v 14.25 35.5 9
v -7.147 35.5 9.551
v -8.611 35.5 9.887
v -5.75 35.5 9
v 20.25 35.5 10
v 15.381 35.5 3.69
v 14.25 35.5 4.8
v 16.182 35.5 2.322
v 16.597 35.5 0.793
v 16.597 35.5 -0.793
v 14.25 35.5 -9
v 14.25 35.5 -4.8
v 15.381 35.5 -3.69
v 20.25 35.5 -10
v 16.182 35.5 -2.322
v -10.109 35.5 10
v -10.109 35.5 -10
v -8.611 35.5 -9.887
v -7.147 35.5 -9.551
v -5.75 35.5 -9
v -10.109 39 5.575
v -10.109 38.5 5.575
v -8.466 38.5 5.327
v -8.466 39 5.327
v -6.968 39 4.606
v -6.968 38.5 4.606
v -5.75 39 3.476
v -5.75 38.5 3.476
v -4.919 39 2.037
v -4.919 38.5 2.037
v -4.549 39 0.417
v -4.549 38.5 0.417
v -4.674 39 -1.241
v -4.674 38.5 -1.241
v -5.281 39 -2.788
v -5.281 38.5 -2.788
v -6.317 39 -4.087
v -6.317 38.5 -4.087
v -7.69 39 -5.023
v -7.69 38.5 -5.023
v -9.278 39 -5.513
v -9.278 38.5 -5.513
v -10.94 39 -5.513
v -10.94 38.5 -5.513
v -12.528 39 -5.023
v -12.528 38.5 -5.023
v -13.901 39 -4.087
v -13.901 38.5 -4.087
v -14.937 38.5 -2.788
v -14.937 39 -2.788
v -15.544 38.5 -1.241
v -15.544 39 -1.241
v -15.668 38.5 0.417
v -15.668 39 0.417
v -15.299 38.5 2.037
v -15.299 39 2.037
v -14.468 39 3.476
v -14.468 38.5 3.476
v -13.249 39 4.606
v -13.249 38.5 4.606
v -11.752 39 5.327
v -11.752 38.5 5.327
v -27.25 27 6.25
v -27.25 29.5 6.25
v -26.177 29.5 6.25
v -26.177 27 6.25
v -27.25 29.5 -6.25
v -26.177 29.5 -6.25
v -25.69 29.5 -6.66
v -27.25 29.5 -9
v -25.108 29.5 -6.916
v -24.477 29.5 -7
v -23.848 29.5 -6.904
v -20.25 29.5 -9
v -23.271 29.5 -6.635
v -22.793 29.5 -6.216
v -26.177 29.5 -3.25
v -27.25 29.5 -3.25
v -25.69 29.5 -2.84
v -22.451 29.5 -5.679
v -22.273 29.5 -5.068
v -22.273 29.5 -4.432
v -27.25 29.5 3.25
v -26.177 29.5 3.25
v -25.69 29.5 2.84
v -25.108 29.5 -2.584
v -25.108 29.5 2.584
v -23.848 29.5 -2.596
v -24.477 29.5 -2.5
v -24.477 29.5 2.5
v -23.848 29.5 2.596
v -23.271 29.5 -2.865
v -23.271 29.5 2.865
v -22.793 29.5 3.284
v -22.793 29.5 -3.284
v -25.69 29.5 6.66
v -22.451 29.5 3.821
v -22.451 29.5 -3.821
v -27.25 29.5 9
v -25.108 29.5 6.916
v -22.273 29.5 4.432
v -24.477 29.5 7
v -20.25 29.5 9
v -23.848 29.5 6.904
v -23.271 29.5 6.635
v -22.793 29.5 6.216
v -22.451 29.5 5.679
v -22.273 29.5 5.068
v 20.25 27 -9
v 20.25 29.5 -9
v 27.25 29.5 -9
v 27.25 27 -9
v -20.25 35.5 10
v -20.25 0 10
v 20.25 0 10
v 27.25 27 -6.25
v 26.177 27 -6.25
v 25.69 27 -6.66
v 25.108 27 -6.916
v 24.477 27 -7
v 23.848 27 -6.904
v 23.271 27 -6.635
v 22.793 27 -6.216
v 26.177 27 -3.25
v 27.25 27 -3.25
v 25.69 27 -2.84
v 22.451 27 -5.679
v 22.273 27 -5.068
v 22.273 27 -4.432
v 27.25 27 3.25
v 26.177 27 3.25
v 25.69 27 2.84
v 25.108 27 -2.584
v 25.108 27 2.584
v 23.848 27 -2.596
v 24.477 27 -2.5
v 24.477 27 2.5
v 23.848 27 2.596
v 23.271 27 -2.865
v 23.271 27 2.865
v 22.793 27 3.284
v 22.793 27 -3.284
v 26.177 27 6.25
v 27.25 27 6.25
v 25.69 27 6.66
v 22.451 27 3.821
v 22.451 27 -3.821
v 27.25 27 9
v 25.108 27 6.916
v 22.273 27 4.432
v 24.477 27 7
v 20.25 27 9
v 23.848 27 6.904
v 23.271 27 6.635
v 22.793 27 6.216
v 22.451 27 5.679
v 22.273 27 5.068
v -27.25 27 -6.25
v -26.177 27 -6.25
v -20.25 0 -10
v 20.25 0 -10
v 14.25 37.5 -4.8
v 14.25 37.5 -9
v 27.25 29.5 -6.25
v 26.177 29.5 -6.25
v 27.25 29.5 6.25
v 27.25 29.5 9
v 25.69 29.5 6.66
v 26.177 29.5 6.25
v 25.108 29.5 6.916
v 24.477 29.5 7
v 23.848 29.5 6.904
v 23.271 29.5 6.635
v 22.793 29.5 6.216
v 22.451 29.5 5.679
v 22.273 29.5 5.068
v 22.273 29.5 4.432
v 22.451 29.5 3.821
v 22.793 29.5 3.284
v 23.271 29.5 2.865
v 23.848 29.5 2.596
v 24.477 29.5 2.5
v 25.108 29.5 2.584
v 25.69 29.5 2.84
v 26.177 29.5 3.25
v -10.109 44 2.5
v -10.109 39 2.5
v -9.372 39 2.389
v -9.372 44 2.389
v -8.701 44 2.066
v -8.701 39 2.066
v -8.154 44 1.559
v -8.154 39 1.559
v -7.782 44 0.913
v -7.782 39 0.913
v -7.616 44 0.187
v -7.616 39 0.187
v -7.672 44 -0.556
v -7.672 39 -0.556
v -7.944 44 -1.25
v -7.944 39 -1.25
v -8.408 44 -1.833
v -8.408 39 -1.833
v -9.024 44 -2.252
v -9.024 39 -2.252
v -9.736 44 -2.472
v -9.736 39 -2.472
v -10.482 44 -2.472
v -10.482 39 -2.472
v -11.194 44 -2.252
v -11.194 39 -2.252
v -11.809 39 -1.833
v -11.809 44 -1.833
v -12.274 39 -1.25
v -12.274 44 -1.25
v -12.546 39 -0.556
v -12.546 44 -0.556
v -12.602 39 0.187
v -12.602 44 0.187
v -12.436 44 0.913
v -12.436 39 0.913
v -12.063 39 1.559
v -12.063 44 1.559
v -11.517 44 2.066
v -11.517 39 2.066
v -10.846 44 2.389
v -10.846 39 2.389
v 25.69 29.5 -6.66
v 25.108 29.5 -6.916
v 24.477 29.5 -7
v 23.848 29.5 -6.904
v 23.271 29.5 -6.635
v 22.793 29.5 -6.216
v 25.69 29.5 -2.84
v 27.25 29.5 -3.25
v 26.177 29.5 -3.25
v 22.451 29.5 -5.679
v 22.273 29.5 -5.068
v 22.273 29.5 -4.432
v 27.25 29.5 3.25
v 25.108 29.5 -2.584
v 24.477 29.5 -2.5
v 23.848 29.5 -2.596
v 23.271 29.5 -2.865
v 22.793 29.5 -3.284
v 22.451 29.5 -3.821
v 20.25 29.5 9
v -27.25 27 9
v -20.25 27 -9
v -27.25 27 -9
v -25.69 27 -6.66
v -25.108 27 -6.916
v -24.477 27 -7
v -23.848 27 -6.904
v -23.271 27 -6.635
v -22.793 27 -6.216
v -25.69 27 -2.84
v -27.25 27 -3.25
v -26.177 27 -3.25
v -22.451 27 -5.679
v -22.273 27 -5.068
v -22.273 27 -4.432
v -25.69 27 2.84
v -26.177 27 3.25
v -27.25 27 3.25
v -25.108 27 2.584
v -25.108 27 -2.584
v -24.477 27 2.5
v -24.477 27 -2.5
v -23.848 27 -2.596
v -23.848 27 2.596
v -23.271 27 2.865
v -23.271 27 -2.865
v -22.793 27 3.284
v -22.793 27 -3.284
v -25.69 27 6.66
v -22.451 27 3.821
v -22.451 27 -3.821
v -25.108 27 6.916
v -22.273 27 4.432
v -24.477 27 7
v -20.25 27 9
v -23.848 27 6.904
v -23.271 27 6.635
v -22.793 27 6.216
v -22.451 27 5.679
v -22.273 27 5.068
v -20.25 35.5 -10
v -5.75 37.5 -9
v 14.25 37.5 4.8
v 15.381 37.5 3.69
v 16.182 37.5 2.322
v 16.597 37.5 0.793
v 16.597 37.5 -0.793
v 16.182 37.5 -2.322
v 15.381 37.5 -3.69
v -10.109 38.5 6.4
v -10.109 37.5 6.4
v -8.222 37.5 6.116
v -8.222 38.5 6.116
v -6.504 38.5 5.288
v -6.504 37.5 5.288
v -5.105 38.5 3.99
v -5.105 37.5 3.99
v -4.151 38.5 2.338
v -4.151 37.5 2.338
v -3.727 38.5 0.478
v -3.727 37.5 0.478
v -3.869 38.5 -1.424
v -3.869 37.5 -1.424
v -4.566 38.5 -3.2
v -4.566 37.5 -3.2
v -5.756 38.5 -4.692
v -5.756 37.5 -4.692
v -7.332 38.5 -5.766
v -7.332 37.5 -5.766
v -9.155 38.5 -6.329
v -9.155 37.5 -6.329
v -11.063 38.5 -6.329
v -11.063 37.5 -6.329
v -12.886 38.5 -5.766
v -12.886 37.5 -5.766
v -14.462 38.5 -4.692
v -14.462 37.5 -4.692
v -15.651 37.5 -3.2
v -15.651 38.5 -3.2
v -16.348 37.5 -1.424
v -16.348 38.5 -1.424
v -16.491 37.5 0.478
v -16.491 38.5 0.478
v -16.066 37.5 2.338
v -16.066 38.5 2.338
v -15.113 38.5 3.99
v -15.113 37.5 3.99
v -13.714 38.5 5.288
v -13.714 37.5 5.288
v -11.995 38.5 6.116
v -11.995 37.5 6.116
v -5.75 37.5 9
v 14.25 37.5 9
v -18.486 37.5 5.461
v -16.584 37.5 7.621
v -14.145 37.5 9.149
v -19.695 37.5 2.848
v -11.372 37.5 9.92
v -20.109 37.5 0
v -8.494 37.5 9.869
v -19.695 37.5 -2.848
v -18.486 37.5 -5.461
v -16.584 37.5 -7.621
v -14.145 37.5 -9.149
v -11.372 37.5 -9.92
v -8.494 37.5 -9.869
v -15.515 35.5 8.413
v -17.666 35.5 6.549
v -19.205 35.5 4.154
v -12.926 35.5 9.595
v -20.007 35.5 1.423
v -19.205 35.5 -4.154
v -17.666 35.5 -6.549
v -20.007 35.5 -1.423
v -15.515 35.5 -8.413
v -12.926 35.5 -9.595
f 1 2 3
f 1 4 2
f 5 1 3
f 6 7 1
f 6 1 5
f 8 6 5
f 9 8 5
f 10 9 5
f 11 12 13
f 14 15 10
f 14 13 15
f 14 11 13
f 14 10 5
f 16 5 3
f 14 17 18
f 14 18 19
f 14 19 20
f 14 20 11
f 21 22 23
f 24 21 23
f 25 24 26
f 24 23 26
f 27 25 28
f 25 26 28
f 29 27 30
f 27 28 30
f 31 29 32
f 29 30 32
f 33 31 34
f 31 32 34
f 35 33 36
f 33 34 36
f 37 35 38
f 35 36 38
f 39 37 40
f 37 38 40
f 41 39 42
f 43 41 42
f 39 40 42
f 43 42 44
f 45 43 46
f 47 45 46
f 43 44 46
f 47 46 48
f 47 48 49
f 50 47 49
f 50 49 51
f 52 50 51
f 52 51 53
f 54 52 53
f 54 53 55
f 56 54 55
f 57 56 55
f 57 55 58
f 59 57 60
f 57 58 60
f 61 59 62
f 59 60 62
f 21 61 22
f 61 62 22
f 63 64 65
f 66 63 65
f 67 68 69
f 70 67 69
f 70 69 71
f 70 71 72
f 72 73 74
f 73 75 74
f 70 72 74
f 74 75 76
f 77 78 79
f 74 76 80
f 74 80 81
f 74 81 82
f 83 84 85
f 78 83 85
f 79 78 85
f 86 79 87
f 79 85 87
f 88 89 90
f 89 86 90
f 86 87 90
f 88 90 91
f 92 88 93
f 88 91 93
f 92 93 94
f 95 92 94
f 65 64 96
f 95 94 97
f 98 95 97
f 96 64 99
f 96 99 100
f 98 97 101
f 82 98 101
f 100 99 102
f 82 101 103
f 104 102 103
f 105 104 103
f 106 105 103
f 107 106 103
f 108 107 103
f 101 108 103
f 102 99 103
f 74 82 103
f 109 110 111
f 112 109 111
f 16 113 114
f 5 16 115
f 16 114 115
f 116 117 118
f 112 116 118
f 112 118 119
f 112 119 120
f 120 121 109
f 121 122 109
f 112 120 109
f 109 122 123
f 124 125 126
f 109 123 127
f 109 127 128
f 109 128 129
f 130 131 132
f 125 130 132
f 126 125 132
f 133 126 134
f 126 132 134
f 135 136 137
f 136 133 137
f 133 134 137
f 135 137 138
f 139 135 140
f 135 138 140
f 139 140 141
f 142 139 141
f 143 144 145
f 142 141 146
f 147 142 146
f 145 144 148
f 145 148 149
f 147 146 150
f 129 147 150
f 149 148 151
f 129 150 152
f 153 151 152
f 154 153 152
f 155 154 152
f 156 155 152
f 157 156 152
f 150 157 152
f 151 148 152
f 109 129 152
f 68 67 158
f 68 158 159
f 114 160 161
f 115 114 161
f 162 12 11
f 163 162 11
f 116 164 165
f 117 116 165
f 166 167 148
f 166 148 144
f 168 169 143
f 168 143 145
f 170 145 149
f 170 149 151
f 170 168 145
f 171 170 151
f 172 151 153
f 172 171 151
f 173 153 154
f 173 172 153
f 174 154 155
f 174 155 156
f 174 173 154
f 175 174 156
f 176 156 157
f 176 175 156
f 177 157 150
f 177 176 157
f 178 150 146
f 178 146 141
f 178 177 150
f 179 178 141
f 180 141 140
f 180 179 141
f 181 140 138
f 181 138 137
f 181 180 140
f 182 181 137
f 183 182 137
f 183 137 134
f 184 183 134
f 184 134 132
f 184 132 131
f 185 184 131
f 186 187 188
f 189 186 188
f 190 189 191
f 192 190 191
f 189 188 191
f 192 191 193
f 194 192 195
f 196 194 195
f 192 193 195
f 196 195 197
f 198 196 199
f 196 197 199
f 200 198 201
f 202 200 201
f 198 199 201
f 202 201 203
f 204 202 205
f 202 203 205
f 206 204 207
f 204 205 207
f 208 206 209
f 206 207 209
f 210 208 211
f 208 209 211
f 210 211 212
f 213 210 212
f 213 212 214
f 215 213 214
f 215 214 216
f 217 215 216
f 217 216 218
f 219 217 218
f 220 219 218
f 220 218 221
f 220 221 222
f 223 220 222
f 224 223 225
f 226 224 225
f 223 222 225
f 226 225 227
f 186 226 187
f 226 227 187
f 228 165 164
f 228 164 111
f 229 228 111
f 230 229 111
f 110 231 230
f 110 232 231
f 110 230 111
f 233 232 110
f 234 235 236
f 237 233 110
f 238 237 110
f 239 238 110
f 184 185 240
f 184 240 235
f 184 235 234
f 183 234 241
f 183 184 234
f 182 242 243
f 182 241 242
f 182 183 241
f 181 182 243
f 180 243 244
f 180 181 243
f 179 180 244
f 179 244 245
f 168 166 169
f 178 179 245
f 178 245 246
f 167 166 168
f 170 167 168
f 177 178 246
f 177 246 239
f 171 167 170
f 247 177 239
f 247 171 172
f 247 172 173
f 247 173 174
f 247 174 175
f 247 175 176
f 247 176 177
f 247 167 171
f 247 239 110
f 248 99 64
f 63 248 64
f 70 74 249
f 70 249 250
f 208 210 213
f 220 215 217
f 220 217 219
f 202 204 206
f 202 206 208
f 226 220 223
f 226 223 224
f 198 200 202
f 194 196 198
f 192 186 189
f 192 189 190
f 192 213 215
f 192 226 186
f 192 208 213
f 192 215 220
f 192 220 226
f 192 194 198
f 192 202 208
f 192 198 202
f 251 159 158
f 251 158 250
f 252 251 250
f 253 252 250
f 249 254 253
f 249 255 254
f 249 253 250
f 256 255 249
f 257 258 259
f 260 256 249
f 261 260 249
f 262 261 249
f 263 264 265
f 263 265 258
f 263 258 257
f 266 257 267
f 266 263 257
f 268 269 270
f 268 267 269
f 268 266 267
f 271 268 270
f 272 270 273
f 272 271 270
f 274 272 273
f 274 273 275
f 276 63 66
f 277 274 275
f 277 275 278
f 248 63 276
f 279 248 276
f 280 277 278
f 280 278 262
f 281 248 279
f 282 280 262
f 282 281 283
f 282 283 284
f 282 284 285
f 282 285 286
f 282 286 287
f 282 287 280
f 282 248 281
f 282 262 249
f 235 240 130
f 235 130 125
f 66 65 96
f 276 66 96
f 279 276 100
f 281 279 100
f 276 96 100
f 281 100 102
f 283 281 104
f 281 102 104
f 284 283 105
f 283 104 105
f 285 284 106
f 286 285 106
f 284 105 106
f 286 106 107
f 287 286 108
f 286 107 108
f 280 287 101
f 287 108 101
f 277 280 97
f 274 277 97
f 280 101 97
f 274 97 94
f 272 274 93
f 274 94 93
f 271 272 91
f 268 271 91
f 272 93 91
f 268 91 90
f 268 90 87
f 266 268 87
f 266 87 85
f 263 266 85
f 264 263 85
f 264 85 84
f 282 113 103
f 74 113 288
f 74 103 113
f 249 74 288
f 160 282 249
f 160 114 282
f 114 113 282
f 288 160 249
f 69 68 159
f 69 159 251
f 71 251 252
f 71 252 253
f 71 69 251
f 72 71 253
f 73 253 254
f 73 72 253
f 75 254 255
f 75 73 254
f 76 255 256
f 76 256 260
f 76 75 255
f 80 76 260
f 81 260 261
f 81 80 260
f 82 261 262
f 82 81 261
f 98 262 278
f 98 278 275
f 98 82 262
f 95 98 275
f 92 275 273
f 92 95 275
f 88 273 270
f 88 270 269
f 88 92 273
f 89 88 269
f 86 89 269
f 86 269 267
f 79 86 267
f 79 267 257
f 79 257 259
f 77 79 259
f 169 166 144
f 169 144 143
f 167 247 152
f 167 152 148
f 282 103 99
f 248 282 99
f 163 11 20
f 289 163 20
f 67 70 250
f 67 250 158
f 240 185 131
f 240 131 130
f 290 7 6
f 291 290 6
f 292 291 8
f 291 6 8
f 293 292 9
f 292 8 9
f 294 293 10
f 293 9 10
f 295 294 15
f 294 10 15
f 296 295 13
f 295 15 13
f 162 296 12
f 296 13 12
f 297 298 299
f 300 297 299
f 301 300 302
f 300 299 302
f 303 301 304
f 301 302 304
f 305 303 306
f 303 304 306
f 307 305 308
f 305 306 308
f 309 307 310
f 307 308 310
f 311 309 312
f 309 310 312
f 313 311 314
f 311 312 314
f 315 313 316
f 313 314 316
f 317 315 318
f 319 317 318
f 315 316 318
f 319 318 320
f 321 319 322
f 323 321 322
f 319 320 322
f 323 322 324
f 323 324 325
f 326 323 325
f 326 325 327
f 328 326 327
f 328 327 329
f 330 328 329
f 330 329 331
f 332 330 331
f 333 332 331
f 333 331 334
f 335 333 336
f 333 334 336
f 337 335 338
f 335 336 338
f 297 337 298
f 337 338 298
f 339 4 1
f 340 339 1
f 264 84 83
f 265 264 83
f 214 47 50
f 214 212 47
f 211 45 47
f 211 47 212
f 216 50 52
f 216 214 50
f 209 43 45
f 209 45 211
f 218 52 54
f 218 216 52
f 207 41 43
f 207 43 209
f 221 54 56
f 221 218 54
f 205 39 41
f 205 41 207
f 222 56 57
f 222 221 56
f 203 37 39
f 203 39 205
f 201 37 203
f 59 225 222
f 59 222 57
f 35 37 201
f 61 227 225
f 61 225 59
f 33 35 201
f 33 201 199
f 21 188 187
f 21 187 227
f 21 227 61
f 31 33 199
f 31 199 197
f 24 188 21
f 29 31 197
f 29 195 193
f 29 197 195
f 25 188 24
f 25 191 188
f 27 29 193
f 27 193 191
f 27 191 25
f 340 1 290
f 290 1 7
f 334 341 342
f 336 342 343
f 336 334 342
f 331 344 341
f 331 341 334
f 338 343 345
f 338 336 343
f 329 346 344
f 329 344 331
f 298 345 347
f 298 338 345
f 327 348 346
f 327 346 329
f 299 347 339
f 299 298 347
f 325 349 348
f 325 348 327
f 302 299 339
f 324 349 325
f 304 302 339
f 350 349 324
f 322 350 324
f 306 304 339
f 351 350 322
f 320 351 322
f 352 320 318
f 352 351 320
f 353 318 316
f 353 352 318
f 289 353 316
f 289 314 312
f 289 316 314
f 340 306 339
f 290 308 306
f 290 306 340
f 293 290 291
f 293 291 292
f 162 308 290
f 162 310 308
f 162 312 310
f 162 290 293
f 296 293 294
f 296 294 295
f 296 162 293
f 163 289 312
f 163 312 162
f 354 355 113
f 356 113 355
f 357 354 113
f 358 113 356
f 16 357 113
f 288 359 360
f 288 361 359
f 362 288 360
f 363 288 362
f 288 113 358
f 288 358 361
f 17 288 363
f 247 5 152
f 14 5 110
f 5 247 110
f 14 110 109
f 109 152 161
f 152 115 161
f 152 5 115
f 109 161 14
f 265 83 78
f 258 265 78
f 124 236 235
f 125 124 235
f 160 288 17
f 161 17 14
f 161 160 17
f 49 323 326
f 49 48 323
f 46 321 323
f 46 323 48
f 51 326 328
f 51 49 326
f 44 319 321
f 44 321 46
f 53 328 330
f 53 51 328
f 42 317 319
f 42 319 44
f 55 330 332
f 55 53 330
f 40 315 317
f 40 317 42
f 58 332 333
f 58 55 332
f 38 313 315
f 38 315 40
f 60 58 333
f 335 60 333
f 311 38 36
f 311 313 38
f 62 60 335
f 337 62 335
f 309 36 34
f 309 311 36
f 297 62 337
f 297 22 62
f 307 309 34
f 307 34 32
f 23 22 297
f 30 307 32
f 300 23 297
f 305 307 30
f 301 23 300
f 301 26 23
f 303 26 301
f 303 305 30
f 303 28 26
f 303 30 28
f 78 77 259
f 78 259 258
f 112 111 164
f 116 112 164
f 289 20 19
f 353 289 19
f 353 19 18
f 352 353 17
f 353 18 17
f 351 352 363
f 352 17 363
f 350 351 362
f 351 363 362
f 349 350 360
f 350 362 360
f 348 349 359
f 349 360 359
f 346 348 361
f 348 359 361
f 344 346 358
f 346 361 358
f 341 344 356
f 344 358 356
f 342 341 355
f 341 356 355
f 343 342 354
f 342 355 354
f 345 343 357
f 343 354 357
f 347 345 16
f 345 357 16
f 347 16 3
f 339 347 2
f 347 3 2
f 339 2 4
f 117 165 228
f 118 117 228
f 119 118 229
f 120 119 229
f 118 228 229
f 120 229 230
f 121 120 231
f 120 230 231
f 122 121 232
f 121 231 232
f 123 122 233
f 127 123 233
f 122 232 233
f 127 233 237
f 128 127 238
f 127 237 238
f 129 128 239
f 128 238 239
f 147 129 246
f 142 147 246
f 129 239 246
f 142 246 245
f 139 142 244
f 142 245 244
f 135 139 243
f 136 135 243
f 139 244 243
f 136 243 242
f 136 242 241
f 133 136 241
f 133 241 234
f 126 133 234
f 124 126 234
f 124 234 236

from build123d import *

# Parameters (mm, degrees)
SKETCH1_W            = 40.5
SKETCH1_H            = 20
BOSS_EXTRUDE1_DEPTH  = 35.5
BOSS_EXTRUDE2_DEPTH  = 2
SKETCH3_R            = 6.4
BOSS_EXTRUDE3_DEPTH  = 1
SKETCH4_R            = 5.575
BOSS_EXTRUDE4_DEPTH  = 0.5
BOSS_EXTRUDE5_DEPTH  = 2.5
MIRROR2_COPY_1_DEPTH = 2.5
SKETCH6_R            = 2.5
BOSS_EXTRUDE6_DEPTH  = 5


with BuildPart() as part:
    # Sketch1 → Boss-Extrude1 (new body)
    with BuildSketch(Plane(origin=(0, 0, 0), x_dir=(1, 0, 0), z_dir=(0, 1, 0))):
        Rectangle(SKETCH1_W, SKETCH1_H)
    extrude(amount=BOSS_EXTRUDE1_DEPTH)

    # Sketch2 → Boss-Extrude2 (add)
    with BuildSketch(Plane(origin=(0, 35.5, 0), x_dir=(1, 0, 0), z_dir=(0, 1, 0))):
        with BuildLine():
            Line((-5.75, -9), (14.25, -9))
            Line((14.25, -9), (14.25, -4.8))
            ThreePointArc((14.25, -4.8), (16.65, 0), (14.25, 4.8))
            Line((14.25, 4.8), (14.25, 9))
            Line((14.25, 9), (-5.75, 9))
            ThreePointArc((-5.75, 9), (-20.108898944, 0), (-5.75, -9))
        make_face()
    extrude(amount=BOSS_EXTRUDE2_DEPTH)

    # Sketch3 → Boss-Extrude3 (add)
    with BuildSketch(Plane(origin=(0, 37.5, 0), x_dir=(1, 0, 0), z_dir=(0, 1, 0))):
        with Locations(Location((-10.108898944, 0, 0), (0, 0, 270))):
            Circle(SKETCH3_R)
    extrude(amount=BOSS_EXTRUDE3_DEPTH)

    # Sketch4 → Boss-Extrude4 (add)
    with BuildSketch(Plane(origin=(0, 38.5, 0), x_dir=(1, 0, 0), z_dir=(0, 1, 0))):
        with Locations(Location((-10.108898944, 0, 0), (0, 0, 270))):
            Circle(SKETCH4_R)
    extrude(amount=BOSS_EXTRUDE4_DEPTH)

    # Sketch5 → Boss-Extrude5 (add)
    with BuildSketch(Plane(origin=(0, 29.5, 0), x_dir=(1, 0, 0), z_dir=(0, 1, 0))):
        with BuildLine():
            Line((20.25, 9), (27.25, 9))
            Line((27.25, 9), (27.25, 6.25))
            Line((27.25, 6.25), (26.177050983, 6.25))
            ThreePointArc((26.177050983, 6.25), (22.25, 4.75), (26.177050983, 3.25))
            Line((26.177050983, 3.25), (27.25, 3.25))
            Line((27.25, 3.25), (27.25, 0))
            Line((27.25, 0), (20.25, 0))
            Line((20.25, 0), (20.25, 9))
        make_face()
    boss_extrude5 = extrude(amount=-BOSS_EXTRUDE5_DEPTH)

    # Mirror1: Boss-Extrude5 across plane
    add(boss_extrude5.mirror(Plane(origin=(0, 0, 0), x_dir=(0, 0, 1), z_dir=(1, 0, 0))))

    # Mirror2: Boss-Extrude5 across plane
    add(boss_extrude5.mirror(Plane.XY))

    # Mirror2 copy 1 sketch → Mirror2 copy 1 (add)
    with BuildSketch(Plane(origin=(0, 29.5, 0), x_dir=(-1, 0, 0), z_dir=(0, 1, 0))):
        with BuildLine():
            Line((20.25, 9), (27.25, 9))
            Line((27.25, 9), (27.25, 6.25))
            Line((27.25, 6.25), (26.177050983, 6.25))
            ThreePointArc((26.177050983, 6.25), (22.25, 4.75), (26.177050983, 3.25))
            Line((26.177050983, 3.25), (27.25, 3.25))
            Line((27.25, 3.25), (27.25, 0))
            Line((27.25, 0), (20.25, 0))
            Line((20.25, 0), (20.25, 9))
        make_face()
    extrude(amount=-MIRROR2_COPY_1_DEPTH)

    # Sketch6 → Boss-Extrude6 (add)
    with BuildSketch(Plane(origin=(0, 39, 0), x_dir=(1, 0, 0), z_dir=(0, 1, 0))):
        with Locations(Location((-10.108898944, 0, 0), (0, 0, 270))):
            Circle(SKETCH6_R)
    extrude(amount=BOSS_EXTRUDE6_DEPTH)


solid = part.part
